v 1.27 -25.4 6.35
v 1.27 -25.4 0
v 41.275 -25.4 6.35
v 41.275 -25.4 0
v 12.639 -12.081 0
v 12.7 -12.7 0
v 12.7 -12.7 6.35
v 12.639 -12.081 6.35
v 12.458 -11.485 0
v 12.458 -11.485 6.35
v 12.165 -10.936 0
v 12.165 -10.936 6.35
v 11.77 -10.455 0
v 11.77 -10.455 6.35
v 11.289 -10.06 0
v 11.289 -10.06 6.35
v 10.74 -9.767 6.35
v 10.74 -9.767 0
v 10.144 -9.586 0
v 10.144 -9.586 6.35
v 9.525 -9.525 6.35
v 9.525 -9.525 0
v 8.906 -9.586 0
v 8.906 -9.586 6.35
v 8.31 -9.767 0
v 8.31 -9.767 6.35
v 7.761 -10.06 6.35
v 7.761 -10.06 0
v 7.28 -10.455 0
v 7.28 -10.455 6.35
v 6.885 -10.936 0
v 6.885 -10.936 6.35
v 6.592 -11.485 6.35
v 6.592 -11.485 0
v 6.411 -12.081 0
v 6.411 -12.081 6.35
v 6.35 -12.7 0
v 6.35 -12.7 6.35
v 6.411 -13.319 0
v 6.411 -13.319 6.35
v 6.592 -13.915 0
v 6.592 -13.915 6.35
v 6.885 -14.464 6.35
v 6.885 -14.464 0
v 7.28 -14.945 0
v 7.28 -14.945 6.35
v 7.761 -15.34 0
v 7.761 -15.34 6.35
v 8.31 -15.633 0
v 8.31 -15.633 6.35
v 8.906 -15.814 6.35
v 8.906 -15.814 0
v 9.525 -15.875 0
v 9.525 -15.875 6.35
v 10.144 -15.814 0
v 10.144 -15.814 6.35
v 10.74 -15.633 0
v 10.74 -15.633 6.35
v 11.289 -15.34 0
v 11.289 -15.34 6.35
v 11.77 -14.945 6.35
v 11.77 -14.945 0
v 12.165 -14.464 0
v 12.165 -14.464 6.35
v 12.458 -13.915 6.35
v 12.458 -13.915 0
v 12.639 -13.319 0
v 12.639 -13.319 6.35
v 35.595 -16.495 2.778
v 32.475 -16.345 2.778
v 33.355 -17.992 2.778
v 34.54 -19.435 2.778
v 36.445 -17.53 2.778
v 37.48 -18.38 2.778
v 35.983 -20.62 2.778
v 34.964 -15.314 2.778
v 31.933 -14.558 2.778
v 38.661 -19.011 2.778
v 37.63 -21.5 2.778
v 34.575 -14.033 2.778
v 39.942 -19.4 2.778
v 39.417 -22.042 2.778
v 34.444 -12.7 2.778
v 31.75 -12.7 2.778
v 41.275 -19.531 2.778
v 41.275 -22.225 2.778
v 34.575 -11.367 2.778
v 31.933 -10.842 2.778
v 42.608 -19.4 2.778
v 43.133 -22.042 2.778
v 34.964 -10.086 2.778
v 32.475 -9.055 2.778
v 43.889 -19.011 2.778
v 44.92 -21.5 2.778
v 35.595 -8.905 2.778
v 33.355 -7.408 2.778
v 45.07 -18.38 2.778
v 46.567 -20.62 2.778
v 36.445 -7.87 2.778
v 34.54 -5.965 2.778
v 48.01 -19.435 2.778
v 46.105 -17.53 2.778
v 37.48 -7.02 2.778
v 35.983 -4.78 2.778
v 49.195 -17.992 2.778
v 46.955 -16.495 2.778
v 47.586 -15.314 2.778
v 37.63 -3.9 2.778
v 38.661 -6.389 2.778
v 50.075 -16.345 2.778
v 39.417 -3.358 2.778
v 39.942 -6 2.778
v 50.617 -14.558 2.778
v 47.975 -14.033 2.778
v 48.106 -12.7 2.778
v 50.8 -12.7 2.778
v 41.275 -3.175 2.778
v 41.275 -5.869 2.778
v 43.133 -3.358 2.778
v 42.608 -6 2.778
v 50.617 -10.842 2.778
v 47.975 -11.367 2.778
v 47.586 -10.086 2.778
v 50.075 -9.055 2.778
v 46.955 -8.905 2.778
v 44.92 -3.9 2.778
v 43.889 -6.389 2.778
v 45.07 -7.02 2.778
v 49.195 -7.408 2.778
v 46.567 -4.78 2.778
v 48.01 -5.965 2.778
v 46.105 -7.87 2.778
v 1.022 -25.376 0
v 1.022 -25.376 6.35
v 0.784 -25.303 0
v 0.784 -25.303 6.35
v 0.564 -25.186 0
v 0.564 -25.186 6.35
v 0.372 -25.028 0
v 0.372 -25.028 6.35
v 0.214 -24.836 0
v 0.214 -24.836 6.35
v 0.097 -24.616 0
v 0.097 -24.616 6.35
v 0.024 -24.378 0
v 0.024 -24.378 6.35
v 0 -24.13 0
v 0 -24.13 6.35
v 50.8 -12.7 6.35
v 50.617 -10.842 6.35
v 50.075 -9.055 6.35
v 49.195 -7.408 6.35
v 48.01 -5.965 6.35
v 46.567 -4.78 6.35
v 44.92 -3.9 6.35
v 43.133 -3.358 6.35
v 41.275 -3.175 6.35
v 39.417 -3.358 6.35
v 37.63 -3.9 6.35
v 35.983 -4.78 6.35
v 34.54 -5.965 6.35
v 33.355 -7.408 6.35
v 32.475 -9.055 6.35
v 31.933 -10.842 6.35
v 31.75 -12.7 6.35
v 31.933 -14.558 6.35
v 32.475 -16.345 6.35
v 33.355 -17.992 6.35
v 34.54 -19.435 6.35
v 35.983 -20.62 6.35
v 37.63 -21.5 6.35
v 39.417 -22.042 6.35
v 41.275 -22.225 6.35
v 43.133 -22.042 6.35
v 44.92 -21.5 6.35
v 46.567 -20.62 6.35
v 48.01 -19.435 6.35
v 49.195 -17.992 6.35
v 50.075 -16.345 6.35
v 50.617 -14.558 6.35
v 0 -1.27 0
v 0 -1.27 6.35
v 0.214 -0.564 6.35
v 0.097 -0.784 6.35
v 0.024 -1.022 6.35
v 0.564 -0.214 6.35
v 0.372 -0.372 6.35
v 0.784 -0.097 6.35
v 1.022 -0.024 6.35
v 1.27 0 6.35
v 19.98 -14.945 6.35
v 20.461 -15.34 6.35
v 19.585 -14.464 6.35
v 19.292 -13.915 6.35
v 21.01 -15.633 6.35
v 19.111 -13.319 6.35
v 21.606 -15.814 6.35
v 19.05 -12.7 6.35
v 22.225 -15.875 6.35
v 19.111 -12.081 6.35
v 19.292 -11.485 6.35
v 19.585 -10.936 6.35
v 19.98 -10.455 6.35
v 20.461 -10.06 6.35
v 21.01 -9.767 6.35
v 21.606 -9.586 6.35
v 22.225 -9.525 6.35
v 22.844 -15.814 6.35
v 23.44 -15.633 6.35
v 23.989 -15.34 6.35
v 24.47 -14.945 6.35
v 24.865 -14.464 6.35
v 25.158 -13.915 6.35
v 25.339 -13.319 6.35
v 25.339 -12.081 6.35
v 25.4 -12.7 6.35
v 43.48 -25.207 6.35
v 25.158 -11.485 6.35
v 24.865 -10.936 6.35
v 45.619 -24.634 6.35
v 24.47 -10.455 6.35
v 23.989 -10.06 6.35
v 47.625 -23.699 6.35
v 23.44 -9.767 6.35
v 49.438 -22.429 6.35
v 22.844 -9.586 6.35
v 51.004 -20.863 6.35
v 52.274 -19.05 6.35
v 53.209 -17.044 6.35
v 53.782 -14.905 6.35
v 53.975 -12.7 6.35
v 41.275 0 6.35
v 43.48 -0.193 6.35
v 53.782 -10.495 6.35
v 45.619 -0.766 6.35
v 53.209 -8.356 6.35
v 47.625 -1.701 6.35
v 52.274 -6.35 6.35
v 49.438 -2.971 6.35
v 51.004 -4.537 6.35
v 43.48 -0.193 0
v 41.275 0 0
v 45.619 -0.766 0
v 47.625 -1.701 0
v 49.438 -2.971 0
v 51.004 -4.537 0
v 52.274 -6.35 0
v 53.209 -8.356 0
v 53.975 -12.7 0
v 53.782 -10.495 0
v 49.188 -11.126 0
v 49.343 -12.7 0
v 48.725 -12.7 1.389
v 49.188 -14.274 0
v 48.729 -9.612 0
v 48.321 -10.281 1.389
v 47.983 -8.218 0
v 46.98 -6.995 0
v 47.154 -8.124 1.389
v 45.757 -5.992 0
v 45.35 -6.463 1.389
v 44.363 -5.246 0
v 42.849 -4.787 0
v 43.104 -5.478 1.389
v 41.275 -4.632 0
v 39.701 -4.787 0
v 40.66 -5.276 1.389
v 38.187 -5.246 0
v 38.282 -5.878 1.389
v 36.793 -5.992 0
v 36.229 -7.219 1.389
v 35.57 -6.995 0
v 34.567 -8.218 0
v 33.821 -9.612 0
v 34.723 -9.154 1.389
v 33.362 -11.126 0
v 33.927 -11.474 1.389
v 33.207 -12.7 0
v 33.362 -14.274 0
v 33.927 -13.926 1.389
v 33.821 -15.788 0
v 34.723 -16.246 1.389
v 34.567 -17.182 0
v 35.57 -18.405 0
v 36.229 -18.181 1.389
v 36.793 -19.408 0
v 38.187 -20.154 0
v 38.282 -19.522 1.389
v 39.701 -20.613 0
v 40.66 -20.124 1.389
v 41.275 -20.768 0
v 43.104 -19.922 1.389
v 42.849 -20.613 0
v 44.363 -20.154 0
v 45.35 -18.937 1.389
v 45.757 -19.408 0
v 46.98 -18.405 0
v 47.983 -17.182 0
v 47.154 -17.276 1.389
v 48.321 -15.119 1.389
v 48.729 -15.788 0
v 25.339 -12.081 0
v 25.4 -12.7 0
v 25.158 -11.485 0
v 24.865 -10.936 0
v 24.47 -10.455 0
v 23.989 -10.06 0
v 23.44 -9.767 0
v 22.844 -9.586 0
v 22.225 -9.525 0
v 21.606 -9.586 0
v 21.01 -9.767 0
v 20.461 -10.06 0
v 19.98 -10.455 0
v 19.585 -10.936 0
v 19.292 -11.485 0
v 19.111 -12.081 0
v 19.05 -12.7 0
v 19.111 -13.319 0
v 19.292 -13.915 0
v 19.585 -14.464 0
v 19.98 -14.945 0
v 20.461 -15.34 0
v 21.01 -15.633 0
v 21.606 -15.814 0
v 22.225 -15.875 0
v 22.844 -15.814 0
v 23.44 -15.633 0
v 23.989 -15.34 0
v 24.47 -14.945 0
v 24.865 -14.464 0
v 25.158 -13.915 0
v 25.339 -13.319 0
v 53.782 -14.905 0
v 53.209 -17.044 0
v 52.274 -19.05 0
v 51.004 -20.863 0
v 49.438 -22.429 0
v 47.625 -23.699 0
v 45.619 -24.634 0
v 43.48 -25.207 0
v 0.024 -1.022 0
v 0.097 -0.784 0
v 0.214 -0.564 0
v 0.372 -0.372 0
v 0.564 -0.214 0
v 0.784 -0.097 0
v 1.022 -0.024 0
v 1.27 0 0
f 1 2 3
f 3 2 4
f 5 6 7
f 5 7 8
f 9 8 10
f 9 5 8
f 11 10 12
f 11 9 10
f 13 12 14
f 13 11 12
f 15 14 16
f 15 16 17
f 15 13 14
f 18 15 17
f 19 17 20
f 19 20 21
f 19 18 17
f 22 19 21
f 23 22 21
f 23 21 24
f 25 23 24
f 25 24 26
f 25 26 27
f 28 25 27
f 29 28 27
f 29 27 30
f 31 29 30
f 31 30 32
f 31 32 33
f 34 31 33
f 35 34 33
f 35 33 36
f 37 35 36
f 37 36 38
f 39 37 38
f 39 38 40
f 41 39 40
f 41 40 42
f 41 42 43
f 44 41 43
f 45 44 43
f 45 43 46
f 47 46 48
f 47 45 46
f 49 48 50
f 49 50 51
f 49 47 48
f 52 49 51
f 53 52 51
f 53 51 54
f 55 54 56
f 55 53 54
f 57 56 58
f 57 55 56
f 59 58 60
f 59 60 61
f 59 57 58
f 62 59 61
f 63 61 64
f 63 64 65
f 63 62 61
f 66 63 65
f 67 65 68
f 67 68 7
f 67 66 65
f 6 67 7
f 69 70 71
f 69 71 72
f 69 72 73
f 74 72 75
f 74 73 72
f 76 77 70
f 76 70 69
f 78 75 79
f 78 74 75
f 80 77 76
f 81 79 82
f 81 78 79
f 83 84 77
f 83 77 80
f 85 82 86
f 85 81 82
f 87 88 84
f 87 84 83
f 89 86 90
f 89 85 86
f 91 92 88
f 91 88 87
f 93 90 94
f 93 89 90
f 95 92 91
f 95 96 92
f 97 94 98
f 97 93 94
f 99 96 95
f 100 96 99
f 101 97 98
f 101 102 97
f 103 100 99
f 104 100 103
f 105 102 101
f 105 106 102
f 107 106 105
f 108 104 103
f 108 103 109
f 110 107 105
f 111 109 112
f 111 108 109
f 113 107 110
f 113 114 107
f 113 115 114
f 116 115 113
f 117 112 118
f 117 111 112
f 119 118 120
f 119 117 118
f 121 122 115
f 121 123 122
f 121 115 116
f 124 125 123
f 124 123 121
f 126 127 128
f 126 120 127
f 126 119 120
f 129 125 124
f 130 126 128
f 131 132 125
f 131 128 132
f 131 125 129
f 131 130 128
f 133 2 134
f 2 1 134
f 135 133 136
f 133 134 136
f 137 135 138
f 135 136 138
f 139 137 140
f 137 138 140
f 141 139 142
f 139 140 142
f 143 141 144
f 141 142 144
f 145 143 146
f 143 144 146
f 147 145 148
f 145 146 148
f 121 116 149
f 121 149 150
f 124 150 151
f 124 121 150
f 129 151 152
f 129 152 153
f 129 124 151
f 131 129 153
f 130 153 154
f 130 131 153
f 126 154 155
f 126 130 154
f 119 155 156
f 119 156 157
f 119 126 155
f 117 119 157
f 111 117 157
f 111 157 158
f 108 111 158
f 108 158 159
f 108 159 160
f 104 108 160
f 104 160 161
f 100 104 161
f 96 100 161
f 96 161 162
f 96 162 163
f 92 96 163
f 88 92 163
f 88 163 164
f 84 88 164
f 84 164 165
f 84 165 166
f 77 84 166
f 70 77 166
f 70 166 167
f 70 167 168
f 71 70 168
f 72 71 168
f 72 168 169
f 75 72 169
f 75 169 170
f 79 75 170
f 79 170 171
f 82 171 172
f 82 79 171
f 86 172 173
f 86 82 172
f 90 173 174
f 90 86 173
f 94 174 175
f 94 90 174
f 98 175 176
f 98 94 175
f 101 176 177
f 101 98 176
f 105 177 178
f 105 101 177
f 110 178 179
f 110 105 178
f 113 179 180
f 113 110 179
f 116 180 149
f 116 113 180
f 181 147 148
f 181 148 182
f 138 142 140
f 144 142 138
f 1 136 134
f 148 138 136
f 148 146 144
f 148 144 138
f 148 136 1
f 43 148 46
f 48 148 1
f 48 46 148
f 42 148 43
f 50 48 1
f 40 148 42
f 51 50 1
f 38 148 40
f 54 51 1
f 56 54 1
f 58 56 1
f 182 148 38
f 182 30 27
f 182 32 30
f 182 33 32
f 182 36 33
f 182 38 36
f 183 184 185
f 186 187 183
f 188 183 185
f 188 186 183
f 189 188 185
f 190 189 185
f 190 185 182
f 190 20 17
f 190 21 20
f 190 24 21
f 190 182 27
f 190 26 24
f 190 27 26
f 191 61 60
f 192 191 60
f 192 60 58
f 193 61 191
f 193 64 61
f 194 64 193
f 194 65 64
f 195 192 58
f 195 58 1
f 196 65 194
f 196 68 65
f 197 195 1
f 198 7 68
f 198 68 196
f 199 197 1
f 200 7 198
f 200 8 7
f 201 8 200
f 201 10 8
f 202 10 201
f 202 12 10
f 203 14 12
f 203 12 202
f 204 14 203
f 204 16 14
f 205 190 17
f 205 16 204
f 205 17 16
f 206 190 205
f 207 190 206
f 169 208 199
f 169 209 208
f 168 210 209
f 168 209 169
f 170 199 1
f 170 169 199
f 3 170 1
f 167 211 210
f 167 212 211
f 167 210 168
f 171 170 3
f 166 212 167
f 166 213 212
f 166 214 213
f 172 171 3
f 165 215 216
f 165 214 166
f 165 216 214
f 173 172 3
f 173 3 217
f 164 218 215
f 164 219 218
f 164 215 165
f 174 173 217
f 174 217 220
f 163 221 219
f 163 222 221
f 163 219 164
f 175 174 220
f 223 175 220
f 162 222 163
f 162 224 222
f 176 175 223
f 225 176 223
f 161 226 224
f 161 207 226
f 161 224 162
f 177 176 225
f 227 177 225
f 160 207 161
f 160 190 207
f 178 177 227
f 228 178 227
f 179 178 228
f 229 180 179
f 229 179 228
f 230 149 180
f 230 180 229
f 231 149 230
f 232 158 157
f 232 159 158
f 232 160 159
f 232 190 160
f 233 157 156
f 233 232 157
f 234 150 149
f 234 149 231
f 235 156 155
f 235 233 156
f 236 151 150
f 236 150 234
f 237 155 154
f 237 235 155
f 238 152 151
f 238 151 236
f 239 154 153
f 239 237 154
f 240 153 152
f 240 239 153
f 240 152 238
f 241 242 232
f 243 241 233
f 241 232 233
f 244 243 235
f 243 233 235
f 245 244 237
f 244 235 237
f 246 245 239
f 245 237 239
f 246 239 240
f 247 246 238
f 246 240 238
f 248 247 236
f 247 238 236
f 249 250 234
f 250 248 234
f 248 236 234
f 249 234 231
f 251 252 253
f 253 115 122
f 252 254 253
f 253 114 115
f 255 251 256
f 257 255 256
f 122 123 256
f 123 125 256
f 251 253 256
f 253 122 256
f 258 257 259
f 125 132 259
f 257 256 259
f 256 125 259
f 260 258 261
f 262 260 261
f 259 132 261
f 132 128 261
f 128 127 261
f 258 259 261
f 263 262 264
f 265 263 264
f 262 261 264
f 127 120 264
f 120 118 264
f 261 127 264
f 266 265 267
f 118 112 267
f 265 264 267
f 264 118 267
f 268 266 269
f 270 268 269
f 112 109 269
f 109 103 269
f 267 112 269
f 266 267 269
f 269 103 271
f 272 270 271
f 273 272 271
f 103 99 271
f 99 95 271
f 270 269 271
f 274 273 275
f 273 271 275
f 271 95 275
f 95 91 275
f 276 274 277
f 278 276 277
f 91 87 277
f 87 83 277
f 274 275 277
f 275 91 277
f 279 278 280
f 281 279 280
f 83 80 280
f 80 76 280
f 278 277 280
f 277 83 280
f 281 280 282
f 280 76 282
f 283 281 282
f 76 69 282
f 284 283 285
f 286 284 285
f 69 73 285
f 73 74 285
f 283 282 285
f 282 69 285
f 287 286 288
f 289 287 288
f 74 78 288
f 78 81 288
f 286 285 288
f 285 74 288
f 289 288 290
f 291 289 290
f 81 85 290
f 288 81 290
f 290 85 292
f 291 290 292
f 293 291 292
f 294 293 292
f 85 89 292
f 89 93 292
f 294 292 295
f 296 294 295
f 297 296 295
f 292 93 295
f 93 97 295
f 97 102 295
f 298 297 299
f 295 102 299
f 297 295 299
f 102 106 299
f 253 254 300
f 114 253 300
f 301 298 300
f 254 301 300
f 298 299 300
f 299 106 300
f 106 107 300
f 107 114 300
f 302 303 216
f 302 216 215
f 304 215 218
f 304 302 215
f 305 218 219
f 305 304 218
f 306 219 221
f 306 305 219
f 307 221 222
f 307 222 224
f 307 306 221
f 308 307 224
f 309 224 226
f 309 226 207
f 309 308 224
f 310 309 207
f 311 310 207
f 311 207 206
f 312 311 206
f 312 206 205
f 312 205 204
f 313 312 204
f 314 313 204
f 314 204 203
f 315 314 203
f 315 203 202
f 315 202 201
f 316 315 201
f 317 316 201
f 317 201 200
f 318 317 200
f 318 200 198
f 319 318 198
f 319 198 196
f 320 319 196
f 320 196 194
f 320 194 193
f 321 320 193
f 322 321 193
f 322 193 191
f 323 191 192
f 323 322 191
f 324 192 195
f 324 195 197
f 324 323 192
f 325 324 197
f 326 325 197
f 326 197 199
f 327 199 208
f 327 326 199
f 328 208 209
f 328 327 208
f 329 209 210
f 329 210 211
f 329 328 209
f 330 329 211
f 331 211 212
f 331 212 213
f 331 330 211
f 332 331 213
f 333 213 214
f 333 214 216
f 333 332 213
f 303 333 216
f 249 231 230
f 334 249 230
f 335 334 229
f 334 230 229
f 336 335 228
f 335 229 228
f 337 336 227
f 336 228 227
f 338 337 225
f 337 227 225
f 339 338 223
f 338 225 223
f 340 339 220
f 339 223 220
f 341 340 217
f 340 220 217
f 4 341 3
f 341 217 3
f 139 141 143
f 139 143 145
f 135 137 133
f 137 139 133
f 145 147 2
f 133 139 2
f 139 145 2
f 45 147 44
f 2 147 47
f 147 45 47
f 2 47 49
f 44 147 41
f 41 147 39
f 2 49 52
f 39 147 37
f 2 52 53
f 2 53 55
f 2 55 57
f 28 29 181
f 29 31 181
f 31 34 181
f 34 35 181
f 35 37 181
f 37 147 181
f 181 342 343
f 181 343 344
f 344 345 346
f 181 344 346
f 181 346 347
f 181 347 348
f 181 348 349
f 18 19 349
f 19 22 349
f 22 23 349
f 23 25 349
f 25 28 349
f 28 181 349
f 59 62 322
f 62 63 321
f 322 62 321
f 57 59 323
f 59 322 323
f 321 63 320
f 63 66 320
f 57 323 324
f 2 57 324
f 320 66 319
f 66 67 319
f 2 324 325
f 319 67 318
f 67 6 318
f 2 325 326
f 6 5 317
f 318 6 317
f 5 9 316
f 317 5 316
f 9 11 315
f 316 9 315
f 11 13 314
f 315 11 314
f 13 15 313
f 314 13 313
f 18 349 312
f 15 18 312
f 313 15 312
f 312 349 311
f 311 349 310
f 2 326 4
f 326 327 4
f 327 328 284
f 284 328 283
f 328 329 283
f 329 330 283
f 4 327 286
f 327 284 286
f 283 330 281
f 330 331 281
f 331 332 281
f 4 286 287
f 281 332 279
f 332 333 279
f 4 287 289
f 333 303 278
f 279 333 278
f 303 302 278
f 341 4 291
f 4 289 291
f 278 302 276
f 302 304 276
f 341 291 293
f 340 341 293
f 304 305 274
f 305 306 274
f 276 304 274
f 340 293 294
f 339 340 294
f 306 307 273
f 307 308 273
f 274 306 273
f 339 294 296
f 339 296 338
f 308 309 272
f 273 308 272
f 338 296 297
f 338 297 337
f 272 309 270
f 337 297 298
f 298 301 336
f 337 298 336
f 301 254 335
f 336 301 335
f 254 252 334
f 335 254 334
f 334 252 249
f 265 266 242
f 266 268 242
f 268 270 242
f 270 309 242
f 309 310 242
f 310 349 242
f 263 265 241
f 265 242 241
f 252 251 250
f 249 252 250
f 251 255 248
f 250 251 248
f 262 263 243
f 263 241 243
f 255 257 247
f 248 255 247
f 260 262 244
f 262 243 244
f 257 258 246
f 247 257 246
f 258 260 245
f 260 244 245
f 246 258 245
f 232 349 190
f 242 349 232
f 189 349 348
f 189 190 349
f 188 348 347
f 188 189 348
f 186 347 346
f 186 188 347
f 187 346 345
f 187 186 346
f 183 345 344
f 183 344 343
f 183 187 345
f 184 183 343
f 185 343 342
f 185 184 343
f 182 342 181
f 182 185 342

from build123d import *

# Parameters (mm, degrees)
SKETCH1_W           = 53.975
SKETCH1_H           = 25.4
SKETCH1_R           = 9.525
SKETCH1_R_2         = 3.175
BOSS_EXTRUDE2_DEPTH = 6.35
SKETCH1_5_R         = 9.525
SKETCH1_5_R_2       = 6.35
BOSS_EXTRUDE3_DEPTH = 2.778125
FILLET1_R           = 1.27
CUT_EXTRUDE1_DEPTH  = 60.989858518


with BuildPart() as part:
    # Sketch1 → Boss-Extrude2 (new body)
    with BuildSketch(Plane.XY):
        with Locations((26.9875, -12.7)):
            Rectangle(SKETCH1_W, SKETCH1_H)
        with Locations((41.275, -12.7)):
            Circle(SKETCH1_R, mode=Mode.SUBTRACT)
        with Locations((22.225, -12.7)):
            Circle(SKETCH1_R_2, mode=Mode.SUBTRACT)
        with Locations((9.525, -12.7)):
            Circle(SKETCH1_R_2, mode=Mode.SUBTRACT)
    extrude(amount=BOSS_EXTRUDE2_DEPTH)

    # Sketch1<5> → Boss-Extrude3 (add)
    with BuildSketch(Plane.XY):
        with Locations((41.275, -12.7)):
            Circle(SKETCH1_5_R)
        with Locations((41.275, -12.7)):
            Circle(SKETCH1_5_R_2, mode=Mode.SUBTRACT)
    extrude(amount=BOSS_EXTRUDE3_DEPTH)

    # Fillet1
    fillet1_edges = [part.edges().sort_by_distance(p)[0] for p in [
        (0, -25.4, 3.175),
        (0, 0, 3.175),
        (53.975, -25.4, 3.175),
        (53.975, 0, 3.175),
    ]]
    fillet(fillet1_edges, radius=FILLET1_R)

    # Sketch2 → Cut-Extrude1 (cut, through all)
    with BuildSketch(Plane.XY.offset(6.35)):
        with BuildLine():
            Line((41.275, -25.4), (52.705, -25.4))
            ThreePointArc((52.705, -25.4), (53.603025612, -25.028025612), (53.975, -24.13))
            Line((53.975, -24.13), (53.975, -12.7))
            ThreePointArc((53.975, -12.7), (50.255256121, -21.680256121), (41.275, -25.4))
        make_face()
        with BuildLine():
            ThreePointArc((41.275, 0), (50.255256121, -3.719743879), (53.975, -12.7))
            Line((53.975, -12.7), (53.975, -1.27))
            ThreePointArc((53.975, -1.27), (53.603025612, -0.371974388), (52.705, 0))
            Line((52.705, 0), (41.275, 0))
        make_face()
    extrude(amount=-CUT_EXTRUDE1_DEPTH, mode=Mode.SUBTRACT)

    # Sketch3 → Cut-Revolve3 (revolve, cut)
    with BuildSketch(Plane(origin=(41.275, 0, 0), x_dir=(0, 0, -1), z_dir=(1, 0, 0))):
        Polygon((-2.778125, -11.10969879), (0, -9.872797848), (0, -4.63178881), (-2.778125, -5.868689752), align=None)
    revolve(axis=Axis((41.275, -12.7, 2.778125), (0, 0, -1)), mode=Mode.SUBTRACT)


solid = part.part
